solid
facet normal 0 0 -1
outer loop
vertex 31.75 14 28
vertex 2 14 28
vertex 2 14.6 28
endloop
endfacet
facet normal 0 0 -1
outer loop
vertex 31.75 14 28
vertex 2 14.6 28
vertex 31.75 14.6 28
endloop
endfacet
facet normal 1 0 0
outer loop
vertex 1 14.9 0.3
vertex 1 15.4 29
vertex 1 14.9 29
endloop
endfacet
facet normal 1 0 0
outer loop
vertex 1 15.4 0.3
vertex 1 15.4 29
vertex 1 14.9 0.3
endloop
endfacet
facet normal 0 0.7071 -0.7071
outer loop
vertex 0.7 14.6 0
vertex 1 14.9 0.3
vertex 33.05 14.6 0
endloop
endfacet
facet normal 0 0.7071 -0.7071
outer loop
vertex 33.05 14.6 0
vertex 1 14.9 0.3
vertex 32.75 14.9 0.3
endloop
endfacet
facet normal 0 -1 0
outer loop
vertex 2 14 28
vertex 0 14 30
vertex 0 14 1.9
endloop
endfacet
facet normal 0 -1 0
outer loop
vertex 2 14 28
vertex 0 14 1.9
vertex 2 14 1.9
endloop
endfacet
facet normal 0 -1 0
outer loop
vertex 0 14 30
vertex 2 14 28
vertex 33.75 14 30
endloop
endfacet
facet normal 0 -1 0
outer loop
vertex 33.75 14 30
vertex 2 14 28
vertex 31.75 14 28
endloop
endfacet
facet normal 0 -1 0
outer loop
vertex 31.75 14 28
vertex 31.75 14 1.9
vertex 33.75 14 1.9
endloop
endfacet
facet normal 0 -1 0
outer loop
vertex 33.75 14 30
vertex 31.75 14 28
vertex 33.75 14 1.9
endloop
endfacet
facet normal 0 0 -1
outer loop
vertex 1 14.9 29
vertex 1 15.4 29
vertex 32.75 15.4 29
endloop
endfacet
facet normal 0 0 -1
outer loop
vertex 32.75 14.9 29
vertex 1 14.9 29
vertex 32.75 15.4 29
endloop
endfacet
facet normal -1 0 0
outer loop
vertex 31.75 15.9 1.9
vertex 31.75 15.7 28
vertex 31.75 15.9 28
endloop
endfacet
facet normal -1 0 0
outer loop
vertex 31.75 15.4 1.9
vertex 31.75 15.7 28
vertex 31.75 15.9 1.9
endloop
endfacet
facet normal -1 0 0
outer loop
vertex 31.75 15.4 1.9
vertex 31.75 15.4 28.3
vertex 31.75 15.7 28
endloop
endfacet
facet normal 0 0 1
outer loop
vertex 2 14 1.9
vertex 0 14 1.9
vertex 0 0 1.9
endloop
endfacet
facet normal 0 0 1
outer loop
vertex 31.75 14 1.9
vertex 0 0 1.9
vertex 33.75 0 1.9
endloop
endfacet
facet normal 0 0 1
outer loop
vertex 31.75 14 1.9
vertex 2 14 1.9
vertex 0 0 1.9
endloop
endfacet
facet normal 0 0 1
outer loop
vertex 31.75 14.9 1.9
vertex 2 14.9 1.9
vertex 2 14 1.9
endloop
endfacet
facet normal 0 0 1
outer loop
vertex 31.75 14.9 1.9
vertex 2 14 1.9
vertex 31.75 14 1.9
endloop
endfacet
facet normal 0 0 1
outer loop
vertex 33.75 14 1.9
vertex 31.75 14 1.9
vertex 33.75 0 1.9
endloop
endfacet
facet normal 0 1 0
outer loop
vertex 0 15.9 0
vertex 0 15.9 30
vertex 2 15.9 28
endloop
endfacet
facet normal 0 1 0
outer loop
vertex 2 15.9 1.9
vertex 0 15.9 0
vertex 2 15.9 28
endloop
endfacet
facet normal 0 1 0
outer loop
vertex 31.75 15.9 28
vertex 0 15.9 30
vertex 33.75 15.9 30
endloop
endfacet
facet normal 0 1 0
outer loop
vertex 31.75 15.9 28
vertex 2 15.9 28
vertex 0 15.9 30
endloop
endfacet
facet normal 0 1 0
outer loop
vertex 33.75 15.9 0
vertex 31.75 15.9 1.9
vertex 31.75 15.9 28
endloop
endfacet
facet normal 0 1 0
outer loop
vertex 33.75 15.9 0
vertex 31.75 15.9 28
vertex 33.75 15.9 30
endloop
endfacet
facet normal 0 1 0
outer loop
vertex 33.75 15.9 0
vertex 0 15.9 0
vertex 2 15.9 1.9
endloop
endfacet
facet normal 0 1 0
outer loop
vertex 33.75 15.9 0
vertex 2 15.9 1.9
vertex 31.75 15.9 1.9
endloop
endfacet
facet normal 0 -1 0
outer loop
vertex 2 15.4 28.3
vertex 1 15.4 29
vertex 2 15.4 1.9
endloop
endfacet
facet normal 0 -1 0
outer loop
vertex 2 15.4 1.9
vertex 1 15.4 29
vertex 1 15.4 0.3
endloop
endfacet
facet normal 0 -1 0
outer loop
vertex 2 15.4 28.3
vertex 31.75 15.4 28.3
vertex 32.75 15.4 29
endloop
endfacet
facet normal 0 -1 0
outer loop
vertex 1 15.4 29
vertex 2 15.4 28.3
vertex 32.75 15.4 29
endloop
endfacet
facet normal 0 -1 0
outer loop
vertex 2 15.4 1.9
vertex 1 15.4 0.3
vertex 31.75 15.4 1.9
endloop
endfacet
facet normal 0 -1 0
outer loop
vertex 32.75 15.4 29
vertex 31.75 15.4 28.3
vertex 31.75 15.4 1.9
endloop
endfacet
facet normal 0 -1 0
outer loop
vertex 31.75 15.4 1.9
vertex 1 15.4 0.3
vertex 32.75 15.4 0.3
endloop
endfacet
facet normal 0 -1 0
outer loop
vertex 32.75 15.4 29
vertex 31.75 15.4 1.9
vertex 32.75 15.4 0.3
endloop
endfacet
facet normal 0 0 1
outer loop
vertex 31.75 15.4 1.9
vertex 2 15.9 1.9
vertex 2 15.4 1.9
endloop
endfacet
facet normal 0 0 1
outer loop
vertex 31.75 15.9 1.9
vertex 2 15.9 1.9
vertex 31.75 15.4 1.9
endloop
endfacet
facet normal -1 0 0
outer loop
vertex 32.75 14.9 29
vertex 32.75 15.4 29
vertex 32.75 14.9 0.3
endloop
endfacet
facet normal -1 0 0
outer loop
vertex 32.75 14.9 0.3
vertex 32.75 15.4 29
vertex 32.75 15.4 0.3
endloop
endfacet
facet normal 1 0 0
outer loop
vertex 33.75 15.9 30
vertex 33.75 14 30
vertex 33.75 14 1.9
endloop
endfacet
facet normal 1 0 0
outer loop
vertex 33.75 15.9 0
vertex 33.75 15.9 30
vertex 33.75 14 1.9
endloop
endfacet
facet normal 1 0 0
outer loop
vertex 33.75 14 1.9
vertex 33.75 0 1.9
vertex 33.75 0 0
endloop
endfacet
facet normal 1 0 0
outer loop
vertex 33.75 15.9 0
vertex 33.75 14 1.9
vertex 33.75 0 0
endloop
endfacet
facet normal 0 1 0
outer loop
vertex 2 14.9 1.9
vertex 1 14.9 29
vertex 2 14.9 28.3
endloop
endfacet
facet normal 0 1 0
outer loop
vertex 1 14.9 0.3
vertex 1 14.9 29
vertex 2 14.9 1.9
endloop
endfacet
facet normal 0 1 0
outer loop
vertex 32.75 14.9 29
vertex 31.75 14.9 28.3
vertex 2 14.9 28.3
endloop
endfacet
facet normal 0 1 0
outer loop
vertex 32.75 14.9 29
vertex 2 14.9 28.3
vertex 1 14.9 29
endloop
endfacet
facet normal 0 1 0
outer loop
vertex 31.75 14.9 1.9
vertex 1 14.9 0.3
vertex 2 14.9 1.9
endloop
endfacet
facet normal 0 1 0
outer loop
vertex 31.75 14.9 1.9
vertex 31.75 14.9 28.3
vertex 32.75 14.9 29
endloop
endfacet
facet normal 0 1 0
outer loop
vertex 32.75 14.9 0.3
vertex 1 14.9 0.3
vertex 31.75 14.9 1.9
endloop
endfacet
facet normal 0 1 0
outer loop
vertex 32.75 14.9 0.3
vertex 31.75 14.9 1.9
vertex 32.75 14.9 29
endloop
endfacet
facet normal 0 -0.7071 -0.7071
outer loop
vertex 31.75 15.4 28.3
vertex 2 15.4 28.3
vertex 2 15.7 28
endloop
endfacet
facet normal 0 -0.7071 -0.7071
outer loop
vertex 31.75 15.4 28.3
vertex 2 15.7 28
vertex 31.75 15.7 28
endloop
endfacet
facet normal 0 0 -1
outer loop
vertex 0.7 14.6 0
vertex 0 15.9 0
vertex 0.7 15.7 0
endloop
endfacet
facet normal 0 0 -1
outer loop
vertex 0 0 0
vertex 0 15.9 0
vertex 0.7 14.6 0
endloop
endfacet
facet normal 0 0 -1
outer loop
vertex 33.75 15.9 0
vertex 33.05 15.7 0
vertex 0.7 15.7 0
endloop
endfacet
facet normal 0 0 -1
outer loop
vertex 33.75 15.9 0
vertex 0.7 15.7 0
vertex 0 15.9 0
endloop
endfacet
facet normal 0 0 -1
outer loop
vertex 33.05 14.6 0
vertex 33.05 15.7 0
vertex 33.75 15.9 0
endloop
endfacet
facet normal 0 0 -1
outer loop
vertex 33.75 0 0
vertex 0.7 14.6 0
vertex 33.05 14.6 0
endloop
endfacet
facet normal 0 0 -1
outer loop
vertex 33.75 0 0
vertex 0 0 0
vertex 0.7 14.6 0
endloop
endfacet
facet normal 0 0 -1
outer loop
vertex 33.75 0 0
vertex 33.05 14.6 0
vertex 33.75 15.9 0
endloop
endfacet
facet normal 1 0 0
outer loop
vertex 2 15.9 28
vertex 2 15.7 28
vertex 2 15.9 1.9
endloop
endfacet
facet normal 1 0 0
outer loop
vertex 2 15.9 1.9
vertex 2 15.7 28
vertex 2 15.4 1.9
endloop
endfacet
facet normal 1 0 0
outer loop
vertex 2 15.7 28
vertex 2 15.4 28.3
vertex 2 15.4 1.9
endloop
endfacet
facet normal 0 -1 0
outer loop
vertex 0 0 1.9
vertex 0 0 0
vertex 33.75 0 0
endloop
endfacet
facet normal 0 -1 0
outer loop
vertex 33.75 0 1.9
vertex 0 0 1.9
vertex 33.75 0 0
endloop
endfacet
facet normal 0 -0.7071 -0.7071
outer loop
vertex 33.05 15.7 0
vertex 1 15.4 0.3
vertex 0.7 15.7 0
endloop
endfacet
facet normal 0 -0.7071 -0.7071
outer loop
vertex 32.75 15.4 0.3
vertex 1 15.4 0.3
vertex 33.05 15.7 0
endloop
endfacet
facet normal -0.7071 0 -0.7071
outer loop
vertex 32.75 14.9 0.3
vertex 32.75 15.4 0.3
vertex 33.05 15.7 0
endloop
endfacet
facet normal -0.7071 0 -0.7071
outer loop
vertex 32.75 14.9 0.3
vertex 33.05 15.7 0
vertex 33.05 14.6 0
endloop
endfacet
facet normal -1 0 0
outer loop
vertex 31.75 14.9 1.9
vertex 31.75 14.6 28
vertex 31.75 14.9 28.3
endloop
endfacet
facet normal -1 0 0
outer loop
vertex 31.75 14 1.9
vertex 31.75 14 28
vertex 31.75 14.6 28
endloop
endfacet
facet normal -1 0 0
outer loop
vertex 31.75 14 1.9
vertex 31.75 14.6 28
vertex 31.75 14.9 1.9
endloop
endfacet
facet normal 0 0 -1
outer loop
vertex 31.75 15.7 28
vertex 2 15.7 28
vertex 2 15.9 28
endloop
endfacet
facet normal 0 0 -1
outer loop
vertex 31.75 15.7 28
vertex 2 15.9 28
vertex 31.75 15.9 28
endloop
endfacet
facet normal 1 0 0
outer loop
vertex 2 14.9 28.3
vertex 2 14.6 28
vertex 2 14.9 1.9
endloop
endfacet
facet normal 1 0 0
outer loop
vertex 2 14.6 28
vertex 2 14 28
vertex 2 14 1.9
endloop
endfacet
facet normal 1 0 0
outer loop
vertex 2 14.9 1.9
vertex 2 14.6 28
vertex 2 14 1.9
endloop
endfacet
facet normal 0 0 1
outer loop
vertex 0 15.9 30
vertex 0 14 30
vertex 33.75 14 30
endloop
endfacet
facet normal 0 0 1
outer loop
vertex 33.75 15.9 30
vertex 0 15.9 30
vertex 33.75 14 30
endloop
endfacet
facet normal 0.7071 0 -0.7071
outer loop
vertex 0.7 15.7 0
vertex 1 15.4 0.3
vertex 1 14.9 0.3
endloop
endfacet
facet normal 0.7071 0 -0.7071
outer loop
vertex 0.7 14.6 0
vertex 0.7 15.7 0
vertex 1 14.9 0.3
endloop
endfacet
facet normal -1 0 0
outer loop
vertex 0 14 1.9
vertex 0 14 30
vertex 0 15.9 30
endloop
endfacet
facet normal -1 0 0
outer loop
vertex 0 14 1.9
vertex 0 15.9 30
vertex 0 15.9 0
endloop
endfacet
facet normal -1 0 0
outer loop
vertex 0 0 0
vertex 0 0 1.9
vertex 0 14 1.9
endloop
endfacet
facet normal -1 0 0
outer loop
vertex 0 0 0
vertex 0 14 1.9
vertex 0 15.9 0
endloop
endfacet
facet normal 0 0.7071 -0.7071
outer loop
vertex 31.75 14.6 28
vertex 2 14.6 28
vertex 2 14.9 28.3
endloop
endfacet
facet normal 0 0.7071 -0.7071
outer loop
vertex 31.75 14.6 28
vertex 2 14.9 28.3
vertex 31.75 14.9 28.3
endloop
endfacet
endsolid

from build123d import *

# Parameters (mm, degrees)
ESQUISSE1_W             = 33.75
ESQUISSE1_H             = 14
BOSS_EXTRU_1_DEPTH      = 1.9
ESQUISSE2_W             = 33.75
ESQUISSE2_H             = 30
ESQUISSE2_W_2           = 29.75
ESQUISSE2_H_2           = 26.1
BOSS_EXTRU_2_DEPTH      = 1.9
ENL_V_START             = -0.5
ESQUISSE4_W             = 31.75
ESQUISSE4_H             = 29
ENL_V_MAT_EXTRU_1_DEPTH = 0.5
CHANFREIN1_SIZE         = 0.3


with BuildPart() as part:
    # Esquisse1 → Boss.-Extru.1 (new body)
    with BuildSketch(Plane.XY):
        with Locations((16.875, 7)):
            Rectangle(ESQUISSE1_W, ESQUISSE1_H)
    extrude(amount=BOSS_EXTRU_1_DEPTH)

    # Esquisse2 → Boss.-Extru.2 (add)
    with BuildSketch(Plane(origin=(0, 14, 0), x_dir=(1, 0, 0), z_dir=(0, 1, 0))):
        with Locations((16.875, -15)):
            Rectangle(ESQUISSE2_W, ESQUISSE2_H)
        with Locations((16.875, -14.95)):
            Rectangle(ESQUISSE2_W_2, ESQUISSE2_H_2, mode=Mode.SUBTRACT)
    extrude(amount=BOSS_EXTRU_2_DEPTH)

    # Esquisse4 → Enlèv. mat.-Extru.1 (cut)
    with BuildSketch(Plane(origin=(0, 15.9, 0), x_dir=(1, 0, 0), z_dir=(0, 1, 0)).offset(ENL_V_START)):
        with Locations((16.875, -14.5)):
            Rectangle(ESQUISSE4_W, ESQUISSE4_H)
    extrude(amount=-ENL_V_MAT_EXTRU_1_DEPTH, mode=Mode.SUBTRACT)

    # Chanfrein1
    chanfrein1_edges = [part.edges().sort_by_distance(p)[0] for p in [
        (16.875, 14.9, 28),
        (16.875, 15.4, 0),
        (16.875, 14.9, 0),
        (1, 15.15, 0),
        (32.75, 15.15, 0),
        (16.875, 15.4, 28),
    ]]
    chamfer(chanfrein1_edges, length=CHANFREIN1_SIZE)


solid = part.part
